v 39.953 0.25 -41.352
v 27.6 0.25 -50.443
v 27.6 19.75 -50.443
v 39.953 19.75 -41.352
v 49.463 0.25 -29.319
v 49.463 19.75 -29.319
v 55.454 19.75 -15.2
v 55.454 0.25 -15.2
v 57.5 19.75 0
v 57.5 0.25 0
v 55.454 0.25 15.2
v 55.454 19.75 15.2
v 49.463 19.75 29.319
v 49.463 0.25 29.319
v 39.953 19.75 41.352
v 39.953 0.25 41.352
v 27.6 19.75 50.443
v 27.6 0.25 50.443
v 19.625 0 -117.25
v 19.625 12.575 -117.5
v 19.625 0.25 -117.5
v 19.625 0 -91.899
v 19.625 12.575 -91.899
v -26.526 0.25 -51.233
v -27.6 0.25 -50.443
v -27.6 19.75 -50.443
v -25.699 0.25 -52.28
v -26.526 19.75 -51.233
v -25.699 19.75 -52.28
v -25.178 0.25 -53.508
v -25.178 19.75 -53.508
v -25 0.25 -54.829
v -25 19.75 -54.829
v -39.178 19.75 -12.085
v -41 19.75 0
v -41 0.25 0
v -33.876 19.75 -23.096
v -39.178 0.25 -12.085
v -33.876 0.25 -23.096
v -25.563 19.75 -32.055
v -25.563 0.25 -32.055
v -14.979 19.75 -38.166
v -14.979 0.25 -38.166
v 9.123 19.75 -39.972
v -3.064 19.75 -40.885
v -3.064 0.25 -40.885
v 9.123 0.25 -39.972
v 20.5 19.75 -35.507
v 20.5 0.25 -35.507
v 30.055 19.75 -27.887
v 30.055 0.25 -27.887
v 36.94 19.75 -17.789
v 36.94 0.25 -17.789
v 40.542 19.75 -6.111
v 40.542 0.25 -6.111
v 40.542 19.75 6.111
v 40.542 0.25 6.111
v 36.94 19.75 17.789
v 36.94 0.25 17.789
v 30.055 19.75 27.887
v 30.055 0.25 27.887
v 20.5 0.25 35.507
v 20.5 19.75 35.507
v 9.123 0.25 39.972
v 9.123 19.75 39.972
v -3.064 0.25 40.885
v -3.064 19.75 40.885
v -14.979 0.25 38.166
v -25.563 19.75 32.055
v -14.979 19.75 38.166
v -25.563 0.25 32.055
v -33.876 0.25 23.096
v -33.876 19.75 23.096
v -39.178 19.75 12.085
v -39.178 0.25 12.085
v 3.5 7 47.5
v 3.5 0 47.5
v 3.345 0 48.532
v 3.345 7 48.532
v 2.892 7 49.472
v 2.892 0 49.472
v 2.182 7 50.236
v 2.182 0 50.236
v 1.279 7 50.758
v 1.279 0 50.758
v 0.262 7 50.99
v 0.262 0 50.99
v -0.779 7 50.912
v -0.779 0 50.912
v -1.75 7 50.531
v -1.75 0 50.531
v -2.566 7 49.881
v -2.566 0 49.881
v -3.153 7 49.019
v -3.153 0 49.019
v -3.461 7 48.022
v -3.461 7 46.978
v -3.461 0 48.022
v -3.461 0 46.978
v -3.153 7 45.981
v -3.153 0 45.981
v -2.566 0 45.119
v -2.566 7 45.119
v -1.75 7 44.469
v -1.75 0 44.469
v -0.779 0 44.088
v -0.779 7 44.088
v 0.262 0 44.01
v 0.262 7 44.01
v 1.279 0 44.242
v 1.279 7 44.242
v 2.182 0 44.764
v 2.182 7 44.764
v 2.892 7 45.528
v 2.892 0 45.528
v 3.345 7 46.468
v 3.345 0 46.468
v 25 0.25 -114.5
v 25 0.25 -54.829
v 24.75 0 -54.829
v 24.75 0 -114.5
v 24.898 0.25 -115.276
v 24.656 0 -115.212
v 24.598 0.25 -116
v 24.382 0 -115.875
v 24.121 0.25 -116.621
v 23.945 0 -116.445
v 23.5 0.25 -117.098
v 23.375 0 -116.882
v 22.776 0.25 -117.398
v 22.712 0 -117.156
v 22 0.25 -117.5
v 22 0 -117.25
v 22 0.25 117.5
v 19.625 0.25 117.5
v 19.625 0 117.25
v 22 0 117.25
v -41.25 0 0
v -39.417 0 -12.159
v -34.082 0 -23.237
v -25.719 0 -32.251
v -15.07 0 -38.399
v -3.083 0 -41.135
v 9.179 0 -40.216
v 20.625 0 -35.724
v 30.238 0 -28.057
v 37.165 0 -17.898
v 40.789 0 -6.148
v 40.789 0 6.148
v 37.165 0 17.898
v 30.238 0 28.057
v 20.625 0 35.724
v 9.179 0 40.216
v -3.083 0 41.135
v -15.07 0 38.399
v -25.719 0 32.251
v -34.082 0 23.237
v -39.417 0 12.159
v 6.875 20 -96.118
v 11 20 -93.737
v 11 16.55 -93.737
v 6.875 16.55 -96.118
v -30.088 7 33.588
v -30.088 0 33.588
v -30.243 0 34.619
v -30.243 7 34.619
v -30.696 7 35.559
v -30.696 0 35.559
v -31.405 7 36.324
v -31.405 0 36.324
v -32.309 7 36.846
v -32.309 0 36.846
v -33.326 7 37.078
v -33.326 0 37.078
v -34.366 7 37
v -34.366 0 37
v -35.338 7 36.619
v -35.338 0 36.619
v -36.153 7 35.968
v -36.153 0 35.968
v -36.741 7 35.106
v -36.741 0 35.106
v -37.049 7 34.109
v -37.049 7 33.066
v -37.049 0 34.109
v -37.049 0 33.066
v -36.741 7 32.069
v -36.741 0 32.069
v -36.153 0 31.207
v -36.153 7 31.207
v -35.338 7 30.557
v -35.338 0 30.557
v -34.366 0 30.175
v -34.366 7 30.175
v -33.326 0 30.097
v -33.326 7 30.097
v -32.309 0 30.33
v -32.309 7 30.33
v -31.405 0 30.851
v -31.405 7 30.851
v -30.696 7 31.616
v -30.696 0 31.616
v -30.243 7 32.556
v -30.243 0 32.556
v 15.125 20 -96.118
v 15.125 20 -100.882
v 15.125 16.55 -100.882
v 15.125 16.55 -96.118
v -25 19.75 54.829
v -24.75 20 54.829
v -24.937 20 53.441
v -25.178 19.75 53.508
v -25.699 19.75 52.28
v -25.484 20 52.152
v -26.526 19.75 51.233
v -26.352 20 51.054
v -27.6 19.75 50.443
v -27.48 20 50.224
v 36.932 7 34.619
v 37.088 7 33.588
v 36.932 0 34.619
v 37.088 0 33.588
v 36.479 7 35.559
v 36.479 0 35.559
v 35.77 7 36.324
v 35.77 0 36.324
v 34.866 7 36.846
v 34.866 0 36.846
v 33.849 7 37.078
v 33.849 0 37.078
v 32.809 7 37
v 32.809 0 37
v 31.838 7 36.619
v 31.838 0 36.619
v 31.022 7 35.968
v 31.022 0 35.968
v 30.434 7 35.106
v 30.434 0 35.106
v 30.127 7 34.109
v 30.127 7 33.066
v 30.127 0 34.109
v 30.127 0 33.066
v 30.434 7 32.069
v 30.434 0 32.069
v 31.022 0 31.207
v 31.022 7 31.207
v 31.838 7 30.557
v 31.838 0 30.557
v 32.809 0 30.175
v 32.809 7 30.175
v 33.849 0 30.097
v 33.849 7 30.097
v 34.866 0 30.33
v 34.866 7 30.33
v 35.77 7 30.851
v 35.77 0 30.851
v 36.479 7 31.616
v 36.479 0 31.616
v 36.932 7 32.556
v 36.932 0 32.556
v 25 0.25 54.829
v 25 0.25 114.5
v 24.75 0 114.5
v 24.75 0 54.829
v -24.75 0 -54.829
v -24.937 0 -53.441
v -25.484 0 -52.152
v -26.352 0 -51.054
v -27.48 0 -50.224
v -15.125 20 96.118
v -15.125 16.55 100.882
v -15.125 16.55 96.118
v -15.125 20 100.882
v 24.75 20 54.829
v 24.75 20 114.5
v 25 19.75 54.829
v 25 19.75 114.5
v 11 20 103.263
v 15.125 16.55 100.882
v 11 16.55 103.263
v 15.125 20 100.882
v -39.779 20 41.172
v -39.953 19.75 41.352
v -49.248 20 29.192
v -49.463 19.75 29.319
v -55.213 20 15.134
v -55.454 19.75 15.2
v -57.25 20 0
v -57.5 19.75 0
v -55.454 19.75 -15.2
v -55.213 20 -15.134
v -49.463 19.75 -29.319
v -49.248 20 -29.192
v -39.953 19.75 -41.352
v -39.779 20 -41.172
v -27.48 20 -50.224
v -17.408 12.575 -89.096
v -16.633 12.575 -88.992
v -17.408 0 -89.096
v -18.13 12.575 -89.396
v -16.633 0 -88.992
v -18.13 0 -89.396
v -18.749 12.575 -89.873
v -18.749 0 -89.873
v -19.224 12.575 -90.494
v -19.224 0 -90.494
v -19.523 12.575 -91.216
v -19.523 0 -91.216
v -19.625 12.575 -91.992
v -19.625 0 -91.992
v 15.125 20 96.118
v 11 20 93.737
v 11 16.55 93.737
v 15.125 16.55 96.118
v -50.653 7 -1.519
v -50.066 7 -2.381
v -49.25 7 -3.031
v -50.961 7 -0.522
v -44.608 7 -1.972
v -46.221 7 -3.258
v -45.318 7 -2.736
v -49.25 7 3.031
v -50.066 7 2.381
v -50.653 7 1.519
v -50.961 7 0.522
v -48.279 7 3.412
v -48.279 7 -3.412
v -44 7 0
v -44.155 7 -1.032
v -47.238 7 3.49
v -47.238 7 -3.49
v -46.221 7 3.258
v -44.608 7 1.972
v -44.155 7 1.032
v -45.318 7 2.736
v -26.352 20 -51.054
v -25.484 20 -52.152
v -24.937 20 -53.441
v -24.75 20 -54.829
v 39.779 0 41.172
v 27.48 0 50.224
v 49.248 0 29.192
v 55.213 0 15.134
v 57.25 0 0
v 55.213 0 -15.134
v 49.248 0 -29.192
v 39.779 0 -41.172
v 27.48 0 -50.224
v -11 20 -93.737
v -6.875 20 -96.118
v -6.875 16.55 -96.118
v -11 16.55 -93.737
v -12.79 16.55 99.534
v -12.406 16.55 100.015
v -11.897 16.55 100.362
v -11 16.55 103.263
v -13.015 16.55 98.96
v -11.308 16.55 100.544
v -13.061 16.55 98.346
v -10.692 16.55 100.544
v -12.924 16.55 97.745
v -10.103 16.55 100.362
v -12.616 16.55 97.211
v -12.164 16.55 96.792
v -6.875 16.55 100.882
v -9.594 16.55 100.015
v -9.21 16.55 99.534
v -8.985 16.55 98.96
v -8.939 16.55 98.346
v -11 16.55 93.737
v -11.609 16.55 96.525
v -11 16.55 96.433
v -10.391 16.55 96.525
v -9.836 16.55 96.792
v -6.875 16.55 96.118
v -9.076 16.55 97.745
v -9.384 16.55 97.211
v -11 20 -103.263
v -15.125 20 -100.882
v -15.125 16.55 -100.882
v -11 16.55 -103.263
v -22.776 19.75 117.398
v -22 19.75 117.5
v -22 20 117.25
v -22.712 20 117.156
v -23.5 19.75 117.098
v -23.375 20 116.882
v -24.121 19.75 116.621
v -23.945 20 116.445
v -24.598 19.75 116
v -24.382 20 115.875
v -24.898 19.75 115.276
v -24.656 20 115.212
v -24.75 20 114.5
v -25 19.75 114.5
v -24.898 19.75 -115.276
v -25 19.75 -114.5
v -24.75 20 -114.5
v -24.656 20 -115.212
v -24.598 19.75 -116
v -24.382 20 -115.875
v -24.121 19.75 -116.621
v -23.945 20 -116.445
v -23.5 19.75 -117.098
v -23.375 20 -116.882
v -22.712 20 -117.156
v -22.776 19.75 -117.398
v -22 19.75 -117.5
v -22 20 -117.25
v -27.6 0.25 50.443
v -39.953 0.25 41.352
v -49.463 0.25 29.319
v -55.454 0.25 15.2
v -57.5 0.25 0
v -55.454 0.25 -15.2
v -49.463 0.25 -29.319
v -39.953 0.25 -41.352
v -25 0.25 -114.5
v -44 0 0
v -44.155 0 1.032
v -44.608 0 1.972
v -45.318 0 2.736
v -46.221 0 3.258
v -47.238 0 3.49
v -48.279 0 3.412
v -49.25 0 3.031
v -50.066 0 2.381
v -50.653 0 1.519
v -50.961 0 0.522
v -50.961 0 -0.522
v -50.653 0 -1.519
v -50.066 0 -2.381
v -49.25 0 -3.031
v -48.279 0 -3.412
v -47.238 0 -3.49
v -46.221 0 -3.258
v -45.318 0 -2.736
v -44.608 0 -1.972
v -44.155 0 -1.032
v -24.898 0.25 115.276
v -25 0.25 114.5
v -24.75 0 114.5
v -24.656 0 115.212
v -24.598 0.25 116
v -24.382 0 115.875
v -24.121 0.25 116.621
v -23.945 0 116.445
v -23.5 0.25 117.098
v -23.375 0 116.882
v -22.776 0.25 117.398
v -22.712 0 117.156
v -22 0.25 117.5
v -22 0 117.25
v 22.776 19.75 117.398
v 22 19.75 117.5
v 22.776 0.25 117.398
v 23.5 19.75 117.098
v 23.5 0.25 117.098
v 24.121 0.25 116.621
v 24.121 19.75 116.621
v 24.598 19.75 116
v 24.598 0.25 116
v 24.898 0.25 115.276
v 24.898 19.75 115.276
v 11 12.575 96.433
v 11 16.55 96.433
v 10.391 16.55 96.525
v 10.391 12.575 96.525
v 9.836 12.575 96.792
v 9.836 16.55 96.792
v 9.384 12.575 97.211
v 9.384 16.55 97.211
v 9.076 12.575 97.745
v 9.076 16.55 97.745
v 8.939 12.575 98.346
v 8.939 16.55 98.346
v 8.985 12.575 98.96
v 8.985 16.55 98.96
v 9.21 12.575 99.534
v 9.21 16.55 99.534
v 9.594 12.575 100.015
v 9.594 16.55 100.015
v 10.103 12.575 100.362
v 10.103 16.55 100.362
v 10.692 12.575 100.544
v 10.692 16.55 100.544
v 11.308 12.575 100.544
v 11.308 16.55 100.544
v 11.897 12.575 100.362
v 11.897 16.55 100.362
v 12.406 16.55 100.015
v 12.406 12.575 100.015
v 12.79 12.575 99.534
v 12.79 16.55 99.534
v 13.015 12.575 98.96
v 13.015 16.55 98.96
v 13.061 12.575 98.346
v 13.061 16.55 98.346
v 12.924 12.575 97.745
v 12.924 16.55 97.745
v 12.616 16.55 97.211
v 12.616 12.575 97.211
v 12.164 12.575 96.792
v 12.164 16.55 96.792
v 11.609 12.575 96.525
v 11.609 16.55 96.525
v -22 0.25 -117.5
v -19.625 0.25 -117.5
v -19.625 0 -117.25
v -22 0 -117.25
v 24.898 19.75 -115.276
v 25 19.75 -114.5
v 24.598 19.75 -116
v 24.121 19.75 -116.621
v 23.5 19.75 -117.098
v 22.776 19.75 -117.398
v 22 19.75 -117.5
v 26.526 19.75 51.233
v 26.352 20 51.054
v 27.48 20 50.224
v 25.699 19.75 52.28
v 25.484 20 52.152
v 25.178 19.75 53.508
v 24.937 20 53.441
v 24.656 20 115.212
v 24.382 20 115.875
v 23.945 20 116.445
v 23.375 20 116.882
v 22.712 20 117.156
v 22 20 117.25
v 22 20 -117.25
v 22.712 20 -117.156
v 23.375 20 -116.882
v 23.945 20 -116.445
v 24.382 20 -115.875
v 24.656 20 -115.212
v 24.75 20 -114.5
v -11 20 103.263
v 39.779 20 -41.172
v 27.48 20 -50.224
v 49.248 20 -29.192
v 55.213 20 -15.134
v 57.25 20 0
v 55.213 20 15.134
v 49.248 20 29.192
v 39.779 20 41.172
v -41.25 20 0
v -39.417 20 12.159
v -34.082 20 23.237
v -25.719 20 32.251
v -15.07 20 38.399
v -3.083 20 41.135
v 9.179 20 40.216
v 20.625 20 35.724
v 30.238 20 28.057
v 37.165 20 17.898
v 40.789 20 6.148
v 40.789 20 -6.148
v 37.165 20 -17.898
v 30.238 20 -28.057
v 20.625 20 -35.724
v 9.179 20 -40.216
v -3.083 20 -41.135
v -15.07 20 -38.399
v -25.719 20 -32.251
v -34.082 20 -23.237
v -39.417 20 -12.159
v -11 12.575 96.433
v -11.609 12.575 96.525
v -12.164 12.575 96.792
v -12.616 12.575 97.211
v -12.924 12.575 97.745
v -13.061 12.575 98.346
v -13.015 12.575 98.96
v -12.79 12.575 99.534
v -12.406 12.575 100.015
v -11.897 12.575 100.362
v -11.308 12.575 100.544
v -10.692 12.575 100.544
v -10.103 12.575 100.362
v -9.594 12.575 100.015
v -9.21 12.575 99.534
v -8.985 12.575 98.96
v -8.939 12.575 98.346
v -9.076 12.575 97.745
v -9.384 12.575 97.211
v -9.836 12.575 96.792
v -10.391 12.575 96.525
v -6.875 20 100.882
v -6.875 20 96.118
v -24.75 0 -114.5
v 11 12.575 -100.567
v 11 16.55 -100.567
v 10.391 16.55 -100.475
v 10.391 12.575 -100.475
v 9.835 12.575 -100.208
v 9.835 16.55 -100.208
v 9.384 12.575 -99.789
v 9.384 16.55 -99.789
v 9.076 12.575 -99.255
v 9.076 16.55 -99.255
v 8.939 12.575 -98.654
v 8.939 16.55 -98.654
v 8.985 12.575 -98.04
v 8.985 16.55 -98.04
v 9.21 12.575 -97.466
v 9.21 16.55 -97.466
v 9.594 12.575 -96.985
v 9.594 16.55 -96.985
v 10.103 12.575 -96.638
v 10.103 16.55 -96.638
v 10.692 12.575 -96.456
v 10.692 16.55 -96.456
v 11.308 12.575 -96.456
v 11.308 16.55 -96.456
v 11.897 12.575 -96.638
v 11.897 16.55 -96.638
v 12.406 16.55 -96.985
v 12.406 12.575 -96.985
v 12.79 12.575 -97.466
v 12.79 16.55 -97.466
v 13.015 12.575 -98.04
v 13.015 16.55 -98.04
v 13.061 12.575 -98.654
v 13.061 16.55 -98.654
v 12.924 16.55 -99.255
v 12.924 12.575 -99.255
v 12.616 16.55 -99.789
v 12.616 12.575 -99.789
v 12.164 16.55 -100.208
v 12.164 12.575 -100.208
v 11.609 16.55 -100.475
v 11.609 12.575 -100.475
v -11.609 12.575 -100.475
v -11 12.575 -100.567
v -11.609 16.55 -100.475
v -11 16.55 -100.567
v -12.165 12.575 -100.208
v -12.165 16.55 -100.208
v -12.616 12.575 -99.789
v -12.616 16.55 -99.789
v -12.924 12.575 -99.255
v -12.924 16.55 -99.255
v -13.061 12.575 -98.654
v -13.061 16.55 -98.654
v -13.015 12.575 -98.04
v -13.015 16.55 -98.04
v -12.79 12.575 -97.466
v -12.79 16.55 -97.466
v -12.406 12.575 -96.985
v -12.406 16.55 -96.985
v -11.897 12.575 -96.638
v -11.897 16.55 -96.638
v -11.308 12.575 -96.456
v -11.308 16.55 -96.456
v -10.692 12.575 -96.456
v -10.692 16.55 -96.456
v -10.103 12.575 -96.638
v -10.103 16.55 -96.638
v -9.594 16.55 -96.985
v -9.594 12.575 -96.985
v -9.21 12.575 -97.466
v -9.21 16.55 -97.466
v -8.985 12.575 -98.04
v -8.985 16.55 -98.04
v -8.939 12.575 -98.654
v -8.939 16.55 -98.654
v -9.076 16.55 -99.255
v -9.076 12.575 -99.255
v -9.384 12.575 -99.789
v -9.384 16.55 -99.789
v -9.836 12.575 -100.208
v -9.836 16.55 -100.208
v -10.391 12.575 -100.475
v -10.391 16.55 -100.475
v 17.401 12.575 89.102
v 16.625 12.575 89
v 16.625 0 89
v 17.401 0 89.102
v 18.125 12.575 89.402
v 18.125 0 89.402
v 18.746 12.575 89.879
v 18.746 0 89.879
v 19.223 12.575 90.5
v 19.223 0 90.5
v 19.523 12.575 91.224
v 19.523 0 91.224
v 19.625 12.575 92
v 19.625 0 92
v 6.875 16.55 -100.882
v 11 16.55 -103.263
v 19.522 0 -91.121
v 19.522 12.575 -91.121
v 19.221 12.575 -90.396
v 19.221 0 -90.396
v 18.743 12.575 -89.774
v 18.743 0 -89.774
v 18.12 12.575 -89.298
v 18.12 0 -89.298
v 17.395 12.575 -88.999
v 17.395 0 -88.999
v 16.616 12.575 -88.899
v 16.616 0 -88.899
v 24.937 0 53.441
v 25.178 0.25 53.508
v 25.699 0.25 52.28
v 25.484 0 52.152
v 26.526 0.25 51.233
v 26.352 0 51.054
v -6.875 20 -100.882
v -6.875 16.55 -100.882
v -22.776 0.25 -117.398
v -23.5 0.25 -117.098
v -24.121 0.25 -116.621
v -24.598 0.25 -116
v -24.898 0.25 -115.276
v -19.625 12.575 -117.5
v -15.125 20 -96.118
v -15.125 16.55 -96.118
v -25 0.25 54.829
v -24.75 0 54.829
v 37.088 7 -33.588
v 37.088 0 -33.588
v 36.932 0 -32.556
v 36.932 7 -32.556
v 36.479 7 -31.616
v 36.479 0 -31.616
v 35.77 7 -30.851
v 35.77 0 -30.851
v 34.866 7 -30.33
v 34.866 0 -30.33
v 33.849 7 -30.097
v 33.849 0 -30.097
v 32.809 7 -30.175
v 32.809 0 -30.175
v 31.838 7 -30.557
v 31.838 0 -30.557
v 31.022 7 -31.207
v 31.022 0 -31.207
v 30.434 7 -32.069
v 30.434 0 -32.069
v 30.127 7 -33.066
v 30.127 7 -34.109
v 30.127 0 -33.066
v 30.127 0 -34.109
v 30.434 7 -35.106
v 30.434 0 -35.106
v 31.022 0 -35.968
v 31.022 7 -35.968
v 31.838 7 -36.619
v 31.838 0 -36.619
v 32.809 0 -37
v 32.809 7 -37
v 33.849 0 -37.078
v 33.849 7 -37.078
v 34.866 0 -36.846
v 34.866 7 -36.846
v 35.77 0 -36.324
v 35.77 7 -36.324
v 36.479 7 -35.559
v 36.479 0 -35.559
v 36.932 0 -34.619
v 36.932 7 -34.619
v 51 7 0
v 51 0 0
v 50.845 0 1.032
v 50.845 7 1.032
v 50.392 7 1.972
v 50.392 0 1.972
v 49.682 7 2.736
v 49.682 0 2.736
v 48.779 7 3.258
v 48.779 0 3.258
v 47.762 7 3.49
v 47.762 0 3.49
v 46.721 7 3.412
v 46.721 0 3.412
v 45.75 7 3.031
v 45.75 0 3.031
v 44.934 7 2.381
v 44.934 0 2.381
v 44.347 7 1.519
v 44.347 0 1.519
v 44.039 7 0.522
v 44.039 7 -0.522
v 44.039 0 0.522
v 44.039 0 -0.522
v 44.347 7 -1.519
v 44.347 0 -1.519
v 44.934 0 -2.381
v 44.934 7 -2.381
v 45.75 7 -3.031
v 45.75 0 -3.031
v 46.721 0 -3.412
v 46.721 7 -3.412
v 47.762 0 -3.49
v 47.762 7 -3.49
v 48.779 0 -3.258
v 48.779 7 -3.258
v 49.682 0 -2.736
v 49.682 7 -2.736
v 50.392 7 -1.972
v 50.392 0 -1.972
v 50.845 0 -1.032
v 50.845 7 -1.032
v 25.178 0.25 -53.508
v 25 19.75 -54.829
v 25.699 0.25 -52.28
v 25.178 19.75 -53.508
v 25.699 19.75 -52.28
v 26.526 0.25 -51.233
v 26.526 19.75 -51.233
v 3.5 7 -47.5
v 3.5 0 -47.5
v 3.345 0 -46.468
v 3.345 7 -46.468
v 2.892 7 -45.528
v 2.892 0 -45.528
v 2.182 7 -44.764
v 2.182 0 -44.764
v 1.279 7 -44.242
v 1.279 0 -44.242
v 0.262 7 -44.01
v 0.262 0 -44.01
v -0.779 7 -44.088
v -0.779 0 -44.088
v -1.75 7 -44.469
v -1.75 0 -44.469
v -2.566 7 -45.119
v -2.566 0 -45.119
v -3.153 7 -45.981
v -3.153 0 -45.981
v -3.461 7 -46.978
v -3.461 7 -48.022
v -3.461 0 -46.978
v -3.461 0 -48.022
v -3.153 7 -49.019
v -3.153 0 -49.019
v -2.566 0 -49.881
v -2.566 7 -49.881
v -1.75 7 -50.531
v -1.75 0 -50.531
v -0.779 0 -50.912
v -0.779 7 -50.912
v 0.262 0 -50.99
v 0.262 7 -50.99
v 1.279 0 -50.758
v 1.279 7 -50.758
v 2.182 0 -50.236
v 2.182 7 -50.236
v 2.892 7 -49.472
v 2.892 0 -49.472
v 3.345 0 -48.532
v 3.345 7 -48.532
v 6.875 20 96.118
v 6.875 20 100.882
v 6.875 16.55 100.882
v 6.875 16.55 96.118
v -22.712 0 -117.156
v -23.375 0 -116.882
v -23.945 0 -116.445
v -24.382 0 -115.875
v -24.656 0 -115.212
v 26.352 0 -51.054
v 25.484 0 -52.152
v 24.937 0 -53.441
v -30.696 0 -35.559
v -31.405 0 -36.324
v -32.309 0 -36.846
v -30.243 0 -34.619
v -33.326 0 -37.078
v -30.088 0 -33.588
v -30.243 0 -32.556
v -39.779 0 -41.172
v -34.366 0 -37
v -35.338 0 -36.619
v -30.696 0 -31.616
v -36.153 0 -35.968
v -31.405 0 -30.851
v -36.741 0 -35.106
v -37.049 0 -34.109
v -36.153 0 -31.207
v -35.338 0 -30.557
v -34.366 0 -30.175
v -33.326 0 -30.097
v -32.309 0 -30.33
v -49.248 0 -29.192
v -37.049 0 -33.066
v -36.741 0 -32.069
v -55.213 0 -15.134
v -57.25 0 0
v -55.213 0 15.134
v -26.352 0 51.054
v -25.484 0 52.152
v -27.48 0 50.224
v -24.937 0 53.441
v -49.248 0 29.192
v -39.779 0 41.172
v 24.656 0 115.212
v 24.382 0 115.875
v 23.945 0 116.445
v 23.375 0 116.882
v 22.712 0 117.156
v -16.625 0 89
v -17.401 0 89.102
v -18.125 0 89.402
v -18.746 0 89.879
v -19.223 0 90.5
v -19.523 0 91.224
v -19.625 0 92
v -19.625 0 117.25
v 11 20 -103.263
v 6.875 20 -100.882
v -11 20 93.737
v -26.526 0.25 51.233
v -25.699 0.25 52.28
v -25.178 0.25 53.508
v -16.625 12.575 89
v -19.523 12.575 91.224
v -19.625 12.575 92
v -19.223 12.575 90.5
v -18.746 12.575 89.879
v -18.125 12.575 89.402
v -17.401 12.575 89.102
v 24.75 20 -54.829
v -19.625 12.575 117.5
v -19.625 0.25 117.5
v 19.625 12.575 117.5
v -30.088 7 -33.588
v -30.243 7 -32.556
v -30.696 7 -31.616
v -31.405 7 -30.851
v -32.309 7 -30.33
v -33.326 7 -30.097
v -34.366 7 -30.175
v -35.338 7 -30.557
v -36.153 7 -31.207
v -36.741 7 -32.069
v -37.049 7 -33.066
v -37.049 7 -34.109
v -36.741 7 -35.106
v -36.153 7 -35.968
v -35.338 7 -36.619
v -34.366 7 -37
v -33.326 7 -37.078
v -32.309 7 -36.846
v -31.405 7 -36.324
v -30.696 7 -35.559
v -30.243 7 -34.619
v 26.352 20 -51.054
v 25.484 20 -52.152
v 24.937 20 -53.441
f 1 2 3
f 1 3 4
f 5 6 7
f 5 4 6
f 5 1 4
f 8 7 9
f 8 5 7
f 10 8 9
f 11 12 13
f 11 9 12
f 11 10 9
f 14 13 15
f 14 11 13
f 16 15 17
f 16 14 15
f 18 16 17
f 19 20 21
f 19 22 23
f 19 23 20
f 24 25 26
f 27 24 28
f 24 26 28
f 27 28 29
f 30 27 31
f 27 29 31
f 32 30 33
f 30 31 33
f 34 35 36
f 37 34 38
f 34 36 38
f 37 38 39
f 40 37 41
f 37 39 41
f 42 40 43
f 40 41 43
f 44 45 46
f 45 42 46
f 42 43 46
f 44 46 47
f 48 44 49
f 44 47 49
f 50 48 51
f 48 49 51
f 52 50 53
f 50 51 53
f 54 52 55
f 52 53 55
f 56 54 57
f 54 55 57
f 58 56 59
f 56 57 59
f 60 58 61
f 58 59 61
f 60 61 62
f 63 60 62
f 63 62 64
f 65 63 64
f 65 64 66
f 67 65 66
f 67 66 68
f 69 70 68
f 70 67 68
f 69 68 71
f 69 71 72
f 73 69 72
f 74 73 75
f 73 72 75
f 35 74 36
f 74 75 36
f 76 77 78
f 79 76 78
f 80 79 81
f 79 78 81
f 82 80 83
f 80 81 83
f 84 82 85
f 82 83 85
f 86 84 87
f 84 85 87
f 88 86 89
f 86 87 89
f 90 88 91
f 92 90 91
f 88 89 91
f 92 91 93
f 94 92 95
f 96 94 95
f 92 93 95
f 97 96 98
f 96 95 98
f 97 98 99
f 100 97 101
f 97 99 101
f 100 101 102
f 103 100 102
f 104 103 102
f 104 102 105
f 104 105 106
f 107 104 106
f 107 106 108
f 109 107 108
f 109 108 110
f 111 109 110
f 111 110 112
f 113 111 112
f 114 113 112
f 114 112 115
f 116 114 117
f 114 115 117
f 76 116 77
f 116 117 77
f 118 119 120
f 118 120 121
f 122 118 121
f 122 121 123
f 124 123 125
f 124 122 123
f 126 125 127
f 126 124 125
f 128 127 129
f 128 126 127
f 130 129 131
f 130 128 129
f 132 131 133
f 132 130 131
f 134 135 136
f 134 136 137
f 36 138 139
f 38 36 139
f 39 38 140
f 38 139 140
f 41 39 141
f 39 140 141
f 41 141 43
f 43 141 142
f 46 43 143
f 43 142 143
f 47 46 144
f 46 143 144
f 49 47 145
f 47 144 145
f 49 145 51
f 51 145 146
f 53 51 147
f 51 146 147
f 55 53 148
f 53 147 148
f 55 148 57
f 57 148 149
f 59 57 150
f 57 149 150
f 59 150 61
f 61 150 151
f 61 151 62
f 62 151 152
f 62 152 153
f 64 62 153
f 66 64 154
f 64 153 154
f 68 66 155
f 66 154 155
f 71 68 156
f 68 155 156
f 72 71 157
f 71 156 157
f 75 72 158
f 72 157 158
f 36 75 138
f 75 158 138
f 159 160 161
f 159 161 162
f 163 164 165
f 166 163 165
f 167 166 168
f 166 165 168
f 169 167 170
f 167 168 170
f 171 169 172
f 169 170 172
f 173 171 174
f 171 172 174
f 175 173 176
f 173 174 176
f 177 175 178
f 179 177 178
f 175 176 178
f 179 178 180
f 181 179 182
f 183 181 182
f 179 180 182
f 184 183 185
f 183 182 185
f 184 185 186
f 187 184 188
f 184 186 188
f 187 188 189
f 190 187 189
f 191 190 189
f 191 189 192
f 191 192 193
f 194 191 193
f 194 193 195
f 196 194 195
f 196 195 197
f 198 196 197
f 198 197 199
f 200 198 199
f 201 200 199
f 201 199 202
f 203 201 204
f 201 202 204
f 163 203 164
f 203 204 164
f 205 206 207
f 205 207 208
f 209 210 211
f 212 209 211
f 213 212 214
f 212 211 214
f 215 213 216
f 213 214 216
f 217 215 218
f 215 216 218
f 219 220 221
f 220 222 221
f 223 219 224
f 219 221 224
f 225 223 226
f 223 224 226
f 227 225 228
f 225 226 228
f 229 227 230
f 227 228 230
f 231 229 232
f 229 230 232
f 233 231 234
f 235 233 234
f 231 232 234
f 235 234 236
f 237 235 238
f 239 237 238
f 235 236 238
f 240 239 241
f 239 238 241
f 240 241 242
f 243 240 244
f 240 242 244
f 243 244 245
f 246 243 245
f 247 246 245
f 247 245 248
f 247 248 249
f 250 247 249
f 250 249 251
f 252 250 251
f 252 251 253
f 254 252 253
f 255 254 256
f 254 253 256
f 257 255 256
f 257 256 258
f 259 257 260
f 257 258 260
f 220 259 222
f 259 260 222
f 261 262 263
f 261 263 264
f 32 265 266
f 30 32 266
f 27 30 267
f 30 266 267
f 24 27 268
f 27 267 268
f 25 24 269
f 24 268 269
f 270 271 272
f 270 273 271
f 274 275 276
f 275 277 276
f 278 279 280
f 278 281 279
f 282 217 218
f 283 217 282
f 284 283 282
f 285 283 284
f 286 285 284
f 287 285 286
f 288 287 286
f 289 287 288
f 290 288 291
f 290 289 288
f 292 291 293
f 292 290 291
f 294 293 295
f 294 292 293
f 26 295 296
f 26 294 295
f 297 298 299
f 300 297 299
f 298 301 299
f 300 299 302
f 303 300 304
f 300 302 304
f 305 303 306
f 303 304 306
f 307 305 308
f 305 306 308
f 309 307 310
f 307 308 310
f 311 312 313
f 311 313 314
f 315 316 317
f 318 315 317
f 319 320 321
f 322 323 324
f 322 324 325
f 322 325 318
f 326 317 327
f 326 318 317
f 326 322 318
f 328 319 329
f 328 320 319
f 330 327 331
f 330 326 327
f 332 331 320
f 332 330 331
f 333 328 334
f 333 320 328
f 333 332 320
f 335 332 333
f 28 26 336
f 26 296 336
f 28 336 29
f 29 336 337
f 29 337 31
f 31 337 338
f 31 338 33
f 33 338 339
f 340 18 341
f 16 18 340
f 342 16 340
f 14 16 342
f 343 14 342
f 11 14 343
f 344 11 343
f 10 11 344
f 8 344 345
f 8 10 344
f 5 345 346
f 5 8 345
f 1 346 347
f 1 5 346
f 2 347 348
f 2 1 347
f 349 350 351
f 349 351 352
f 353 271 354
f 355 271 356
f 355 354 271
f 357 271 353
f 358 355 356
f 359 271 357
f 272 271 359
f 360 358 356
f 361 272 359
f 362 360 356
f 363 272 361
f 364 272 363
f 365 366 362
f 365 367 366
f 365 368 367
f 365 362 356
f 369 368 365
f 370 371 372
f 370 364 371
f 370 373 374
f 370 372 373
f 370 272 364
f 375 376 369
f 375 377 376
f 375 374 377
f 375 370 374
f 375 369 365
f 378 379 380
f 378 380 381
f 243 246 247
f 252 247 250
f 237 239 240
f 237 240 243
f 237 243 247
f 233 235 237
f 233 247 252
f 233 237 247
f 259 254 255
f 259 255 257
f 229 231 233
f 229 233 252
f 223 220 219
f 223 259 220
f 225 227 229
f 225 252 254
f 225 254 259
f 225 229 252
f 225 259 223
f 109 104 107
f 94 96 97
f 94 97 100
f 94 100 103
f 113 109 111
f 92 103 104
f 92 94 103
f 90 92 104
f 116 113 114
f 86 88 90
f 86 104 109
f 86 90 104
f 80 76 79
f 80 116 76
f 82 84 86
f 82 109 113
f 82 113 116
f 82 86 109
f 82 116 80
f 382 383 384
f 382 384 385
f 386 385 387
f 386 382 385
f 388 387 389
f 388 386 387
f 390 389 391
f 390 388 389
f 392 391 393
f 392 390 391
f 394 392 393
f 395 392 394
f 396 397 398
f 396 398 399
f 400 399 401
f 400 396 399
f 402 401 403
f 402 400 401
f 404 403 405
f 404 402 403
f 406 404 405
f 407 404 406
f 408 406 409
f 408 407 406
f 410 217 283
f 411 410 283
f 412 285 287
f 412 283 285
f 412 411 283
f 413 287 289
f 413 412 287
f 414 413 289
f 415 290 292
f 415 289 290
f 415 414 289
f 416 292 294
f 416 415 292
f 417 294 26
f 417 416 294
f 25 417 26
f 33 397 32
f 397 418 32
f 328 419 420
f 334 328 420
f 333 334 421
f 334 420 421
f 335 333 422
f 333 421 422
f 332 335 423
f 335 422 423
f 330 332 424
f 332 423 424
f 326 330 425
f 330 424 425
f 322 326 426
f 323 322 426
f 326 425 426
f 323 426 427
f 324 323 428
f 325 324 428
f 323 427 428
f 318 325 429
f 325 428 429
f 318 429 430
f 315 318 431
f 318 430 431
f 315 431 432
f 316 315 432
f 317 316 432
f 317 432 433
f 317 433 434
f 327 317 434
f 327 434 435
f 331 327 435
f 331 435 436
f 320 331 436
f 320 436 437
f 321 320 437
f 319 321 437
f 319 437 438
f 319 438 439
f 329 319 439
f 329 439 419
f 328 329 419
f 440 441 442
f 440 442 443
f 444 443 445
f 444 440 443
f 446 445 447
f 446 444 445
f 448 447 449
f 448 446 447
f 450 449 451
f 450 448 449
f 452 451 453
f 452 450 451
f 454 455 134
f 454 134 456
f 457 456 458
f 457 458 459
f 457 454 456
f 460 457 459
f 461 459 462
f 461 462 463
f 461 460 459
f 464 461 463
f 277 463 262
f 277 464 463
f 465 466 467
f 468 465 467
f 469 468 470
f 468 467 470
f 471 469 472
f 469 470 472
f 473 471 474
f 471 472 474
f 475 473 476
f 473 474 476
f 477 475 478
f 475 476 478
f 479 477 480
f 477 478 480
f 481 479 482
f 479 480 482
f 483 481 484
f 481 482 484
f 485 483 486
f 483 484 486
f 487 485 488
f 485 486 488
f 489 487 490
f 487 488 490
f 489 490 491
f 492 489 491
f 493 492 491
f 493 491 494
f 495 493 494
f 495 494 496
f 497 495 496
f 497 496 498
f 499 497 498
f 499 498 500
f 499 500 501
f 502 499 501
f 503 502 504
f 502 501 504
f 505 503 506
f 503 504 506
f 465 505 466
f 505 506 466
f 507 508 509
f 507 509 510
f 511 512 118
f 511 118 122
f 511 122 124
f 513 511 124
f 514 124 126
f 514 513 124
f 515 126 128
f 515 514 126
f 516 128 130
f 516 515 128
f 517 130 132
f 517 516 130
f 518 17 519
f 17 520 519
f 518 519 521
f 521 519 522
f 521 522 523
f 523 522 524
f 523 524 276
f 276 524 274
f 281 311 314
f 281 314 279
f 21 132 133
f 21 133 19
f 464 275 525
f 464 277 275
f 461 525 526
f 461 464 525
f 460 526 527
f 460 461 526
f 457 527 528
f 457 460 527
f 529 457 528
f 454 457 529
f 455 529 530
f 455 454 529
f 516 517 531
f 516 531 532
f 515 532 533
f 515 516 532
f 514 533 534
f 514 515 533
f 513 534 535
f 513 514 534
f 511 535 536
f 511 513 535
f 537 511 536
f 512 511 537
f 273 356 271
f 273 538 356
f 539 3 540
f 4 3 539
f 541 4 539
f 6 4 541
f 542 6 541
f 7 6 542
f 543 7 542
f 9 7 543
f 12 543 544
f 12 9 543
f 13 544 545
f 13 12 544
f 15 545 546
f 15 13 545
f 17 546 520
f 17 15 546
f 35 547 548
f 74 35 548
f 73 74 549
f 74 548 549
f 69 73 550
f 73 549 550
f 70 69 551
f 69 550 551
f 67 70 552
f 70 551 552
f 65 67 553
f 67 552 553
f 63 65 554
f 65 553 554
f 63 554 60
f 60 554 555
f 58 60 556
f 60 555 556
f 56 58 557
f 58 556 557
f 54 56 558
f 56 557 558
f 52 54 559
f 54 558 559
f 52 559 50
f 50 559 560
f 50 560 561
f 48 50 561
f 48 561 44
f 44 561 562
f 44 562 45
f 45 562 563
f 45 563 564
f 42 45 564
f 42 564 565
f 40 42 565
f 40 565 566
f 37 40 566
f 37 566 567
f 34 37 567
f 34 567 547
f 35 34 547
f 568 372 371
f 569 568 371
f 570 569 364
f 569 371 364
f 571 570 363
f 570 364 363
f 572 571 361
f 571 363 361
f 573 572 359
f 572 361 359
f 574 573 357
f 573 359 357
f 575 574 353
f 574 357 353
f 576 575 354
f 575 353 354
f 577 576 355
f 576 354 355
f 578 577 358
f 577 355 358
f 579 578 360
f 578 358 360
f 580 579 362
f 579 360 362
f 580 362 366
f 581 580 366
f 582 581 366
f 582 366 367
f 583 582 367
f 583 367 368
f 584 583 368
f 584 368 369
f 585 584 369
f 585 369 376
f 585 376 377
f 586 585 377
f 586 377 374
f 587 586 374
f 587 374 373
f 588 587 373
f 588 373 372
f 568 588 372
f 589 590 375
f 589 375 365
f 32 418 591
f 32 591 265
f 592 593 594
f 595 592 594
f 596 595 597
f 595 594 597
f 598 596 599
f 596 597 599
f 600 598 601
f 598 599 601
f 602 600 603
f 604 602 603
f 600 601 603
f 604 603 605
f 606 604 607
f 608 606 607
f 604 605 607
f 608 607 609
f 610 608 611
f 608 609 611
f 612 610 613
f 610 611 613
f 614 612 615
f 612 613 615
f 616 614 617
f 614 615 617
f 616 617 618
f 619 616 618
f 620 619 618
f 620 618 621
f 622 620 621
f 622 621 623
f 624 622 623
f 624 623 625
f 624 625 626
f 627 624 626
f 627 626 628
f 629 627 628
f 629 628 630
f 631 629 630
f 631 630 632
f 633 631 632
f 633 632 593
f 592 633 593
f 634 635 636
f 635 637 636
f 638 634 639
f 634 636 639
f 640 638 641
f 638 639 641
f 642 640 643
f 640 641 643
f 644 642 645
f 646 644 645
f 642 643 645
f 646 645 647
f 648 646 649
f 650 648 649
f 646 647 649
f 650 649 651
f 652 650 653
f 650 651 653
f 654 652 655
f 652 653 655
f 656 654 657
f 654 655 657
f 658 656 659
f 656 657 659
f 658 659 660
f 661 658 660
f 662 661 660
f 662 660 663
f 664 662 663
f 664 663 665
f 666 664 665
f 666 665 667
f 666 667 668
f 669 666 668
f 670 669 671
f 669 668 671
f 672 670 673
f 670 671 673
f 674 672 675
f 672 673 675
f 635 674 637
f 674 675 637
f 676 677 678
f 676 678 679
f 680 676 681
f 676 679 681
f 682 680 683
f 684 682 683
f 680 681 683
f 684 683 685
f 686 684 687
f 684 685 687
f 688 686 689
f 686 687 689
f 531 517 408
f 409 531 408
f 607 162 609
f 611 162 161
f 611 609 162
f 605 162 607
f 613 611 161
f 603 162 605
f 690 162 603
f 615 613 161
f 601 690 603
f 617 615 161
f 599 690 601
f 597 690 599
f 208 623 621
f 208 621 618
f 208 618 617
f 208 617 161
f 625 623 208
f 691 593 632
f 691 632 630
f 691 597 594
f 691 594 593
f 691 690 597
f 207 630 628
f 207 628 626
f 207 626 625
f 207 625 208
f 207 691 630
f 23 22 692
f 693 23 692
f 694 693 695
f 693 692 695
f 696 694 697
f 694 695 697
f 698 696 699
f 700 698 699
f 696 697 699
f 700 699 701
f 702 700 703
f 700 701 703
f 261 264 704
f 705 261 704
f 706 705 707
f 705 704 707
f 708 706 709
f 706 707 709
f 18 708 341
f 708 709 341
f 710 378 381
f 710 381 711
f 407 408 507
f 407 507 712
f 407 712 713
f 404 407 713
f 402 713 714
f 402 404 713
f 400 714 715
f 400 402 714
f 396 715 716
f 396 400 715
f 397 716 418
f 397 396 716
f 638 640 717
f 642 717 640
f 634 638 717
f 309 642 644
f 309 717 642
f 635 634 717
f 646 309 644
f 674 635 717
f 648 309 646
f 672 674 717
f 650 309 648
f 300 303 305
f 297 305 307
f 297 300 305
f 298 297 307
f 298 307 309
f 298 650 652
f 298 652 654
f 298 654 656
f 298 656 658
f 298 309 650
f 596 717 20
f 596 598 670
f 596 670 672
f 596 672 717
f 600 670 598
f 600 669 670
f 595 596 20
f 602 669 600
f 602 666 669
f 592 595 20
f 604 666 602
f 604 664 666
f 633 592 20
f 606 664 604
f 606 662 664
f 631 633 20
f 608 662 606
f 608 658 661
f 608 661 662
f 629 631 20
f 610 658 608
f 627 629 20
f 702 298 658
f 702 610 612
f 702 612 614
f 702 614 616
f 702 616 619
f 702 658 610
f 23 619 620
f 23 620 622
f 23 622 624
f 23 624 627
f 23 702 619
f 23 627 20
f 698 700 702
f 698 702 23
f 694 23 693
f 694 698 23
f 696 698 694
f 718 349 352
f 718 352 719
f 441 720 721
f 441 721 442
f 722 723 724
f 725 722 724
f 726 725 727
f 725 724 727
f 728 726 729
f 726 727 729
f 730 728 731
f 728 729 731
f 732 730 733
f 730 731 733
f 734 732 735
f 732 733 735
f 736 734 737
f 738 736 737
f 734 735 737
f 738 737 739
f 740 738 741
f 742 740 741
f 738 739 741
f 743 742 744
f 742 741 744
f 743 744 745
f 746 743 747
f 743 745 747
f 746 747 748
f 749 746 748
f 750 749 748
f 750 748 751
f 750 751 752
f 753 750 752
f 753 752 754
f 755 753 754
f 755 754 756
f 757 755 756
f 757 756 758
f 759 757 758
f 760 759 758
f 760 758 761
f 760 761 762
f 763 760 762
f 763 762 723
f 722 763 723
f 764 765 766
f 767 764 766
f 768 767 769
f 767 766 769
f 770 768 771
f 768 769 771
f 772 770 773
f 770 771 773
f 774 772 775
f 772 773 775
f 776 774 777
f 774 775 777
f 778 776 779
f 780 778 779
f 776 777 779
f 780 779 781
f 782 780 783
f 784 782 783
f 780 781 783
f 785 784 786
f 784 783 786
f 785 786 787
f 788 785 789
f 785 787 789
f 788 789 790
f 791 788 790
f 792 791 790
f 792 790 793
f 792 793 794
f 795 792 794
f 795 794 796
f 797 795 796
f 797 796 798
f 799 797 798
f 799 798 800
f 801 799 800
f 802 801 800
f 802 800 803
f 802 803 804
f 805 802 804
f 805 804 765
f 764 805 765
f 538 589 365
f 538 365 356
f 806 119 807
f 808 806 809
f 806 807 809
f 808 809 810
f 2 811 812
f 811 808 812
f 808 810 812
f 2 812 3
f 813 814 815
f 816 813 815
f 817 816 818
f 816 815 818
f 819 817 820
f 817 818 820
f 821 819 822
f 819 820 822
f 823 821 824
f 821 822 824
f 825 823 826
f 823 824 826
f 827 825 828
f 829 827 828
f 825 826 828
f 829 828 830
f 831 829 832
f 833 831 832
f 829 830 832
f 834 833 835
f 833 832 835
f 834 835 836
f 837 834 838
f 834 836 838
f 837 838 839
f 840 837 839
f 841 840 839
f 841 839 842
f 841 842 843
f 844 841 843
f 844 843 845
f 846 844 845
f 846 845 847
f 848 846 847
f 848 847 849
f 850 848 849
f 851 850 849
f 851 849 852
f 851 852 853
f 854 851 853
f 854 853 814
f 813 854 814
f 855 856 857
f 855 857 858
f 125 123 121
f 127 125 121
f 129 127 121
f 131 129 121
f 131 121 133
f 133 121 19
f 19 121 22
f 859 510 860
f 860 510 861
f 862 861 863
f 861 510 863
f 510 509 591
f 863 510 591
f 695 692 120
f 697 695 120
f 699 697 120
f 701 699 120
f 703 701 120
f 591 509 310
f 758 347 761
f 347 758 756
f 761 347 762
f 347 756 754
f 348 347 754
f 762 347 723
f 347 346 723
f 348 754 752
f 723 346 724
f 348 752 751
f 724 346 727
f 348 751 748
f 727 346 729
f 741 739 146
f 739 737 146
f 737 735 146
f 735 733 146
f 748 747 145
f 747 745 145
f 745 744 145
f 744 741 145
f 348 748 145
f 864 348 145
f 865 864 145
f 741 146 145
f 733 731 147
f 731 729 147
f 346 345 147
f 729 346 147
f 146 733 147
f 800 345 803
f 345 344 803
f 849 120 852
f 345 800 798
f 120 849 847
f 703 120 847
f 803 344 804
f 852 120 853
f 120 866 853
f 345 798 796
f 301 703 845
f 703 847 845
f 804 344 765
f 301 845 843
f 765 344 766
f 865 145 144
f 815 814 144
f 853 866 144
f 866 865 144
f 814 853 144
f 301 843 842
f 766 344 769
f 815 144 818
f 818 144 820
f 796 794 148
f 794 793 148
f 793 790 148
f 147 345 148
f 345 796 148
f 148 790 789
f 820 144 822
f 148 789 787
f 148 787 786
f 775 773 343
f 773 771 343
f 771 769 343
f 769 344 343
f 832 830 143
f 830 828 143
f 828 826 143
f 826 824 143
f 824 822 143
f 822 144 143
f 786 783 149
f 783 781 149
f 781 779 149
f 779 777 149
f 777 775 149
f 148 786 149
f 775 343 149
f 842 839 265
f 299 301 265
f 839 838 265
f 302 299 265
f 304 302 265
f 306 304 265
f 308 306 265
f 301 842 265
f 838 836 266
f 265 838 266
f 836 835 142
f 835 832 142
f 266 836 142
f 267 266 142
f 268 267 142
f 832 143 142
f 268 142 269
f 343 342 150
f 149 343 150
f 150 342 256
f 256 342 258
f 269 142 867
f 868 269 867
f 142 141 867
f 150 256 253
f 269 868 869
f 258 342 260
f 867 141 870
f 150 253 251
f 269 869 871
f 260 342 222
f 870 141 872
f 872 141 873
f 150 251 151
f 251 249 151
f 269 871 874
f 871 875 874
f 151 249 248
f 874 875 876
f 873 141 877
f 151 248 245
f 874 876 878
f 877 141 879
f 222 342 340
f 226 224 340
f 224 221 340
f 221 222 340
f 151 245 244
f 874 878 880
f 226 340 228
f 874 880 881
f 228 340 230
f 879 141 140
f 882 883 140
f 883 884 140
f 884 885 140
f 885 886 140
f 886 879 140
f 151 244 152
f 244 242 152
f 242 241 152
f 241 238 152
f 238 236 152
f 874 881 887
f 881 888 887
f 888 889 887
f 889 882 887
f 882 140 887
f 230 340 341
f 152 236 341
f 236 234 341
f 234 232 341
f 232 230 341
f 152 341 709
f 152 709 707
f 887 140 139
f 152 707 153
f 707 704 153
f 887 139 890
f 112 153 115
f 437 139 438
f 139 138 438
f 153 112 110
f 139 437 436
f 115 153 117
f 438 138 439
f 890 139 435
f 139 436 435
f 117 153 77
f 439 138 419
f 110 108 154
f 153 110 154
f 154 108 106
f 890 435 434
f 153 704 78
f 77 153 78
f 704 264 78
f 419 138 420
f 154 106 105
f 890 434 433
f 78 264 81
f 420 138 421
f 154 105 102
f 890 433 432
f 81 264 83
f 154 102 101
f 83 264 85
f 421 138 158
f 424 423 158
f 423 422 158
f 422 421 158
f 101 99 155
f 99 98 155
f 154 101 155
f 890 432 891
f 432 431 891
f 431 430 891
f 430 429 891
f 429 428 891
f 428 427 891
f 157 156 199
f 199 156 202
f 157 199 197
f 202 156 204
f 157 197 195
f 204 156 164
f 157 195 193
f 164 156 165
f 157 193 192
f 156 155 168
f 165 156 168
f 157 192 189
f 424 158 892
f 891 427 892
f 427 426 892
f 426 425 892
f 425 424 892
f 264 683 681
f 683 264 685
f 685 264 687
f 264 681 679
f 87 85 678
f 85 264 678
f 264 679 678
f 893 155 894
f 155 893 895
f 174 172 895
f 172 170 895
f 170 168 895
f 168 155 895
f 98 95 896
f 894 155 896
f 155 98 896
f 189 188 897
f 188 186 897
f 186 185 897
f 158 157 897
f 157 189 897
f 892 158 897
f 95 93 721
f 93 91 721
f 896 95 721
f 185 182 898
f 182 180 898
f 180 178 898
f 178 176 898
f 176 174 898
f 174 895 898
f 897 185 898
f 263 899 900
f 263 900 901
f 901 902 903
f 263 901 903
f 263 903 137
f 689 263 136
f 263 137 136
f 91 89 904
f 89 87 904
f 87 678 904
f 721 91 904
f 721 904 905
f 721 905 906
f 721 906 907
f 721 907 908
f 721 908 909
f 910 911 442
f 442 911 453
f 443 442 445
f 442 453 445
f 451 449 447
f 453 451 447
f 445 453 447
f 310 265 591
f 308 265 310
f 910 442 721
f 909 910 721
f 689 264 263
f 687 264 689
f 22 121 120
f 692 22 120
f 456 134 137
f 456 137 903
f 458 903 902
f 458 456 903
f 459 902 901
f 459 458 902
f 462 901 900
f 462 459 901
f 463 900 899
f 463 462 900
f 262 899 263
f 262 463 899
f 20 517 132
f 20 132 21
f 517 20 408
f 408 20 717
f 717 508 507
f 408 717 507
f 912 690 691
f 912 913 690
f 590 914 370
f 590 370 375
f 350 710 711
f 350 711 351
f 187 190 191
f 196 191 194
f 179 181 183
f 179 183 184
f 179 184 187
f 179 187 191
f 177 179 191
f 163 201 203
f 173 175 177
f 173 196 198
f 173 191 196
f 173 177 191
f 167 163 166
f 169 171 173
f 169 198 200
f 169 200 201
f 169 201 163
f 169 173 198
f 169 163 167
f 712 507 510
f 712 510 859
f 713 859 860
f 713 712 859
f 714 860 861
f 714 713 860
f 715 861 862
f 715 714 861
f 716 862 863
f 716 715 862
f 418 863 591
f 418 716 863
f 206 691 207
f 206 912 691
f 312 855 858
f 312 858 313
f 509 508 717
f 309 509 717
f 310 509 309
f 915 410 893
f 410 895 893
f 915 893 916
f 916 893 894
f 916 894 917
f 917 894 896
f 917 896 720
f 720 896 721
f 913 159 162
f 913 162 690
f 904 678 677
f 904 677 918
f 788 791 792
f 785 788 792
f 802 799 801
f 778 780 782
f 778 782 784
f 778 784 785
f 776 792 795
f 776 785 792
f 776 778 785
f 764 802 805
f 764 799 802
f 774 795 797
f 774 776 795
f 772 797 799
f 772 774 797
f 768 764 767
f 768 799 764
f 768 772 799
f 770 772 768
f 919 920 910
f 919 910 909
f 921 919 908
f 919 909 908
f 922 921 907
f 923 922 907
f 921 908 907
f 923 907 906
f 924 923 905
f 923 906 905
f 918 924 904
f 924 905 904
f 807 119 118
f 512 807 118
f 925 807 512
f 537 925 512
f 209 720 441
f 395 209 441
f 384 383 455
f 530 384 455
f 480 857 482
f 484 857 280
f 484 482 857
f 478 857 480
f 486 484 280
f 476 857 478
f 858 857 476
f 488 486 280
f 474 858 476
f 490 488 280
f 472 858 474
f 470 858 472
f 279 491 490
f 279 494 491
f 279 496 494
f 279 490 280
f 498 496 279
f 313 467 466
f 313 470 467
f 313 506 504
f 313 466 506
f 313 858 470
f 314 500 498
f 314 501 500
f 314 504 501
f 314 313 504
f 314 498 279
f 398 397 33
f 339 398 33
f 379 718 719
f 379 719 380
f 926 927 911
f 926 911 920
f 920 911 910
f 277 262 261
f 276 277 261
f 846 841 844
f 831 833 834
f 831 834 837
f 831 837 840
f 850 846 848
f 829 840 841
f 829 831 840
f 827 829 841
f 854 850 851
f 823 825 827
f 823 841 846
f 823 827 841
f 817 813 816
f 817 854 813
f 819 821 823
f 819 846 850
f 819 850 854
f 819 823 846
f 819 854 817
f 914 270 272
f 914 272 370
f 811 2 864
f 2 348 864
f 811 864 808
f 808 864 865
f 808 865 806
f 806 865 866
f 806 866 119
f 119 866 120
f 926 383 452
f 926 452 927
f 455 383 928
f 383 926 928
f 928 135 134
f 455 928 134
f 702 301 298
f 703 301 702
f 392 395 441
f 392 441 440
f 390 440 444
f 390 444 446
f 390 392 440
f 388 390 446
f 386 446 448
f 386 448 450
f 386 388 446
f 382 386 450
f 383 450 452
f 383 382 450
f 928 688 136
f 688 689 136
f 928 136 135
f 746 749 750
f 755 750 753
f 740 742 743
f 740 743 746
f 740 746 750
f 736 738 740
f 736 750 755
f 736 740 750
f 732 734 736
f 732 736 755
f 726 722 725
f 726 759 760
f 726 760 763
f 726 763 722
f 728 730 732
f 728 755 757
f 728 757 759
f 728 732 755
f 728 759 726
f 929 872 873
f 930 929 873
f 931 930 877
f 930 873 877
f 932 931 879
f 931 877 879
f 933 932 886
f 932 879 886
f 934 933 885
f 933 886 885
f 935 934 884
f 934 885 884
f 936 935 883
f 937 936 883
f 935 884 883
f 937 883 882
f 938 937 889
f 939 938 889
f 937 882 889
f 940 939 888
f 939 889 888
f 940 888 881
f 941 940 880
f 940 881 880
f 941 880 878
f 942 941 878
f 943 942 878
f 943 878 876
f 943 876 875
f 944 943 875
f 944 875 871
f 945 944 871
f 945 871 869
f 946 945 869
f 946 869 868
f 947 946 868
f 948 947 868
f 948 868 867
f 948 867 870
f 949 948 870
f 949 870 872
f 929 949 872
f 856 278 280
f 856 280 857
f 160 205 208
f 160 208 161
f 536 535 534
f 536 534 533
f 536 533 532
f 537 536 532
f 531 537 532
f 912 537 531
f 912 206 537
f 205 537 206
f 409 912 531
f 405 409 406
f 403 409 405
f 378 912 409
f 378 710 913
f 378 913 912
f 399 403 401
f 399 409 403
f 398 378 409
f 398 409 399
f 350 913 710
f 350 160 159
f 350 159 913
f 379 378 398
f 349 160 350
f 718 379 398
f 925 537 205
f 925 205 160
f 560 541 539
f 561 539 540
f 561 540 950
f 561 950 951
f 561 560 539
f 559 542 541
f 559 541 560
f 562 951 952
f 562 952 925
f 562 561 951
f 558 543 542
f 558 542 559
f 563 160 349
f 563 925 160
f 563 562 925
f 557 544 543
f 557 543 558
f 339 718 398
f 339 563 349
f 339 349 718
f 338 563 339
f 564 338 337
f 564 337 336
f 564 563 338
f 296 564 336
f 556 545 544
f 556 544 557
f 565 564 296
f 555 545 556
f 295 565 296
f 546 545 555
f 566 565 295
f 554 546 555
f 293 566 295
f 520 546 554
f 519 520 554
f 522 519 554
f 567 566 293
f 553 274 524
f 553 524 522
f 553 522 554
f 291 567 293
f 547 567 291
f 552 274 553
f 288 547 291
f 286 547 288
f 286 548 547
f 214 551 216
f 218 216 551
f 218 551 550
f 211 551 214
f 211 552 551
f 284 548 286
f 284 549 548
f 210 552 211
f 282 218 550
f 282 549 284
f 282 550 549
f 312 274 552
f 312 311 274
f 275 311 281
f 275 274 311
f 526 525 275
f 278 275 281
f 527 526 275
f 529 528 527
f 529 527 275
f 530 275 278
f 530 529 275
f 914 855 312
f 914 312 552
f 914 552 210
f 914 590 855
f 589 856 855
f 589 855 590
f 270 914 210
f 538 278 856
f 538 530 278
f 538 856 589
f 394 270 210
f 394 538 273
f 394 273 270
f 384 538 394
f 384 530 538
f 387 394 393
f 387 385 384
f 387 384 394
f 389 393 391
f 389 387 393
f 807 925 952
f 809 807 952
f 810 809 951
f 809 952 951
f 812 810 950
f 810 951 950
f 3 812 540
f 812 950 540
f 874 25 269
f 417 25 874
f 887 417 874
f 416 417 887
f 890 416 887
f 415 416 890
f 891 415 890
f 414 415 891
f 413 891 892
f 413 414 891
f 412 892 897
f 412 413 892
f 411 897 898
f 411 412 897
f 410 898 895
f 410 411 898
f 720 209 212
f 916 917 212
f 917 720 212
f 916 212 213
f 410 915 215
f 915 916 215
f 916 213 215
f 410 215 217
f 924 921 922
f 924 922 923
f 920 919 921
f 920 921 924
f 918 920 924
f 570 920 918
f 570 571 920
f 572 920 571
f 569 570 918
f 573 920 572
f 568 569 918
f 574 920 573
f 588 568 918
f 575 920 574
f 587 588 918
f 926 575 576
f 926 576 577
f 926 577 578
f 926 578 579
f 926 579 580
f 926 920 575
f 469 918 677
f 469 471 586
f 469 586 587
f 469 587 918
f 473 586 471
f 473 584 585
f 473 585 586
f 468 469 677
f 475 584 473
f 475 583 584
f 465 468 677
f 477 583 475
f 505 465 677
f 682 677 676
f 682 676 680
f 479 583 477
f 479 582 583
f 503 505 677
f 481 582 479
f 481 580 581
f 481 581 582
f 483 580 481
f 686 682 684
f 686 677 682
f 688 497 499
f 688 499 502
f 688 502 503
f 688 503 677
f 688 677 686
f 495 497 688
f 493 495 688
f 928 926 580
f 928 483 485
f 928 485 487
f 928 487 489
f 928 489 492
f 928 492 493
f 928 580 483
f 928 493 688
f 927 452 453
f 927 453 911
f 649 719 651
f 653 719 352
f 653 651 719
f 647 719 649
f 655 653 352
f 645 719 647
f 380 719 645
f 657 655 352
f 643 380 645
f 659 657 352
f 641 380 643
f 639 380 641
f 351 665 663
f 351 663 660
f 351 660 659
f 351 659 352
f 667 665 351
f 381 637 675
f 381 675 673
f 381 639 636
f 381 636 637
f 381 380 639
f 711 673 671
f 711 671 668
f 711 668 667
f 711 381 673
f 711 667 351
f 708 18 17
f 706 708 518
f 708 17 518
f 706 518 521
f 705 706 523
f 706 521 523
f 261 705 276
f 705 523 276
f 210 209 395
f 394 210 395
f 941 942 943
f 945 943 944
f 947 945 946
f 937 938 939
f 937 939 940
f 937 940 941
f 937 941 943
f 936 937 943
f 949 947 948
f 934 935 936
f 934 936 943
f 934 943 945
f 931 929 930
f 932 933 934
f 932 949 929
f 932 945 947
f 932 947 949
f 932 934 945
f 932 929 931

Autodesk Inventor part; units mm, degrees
ref_plane "YZ Plane" through (0, 0, 0) normal (1, 0, 0) x (0, 1, 0)
ref_plane "XZ Plane" through (0, 0, 0) normal (0, 1, 0) x (-1, 0, 0)
ref_plane "XY Plane" through (0, 0, 0) normal (0, 0, 1) x (1, 0, 0)
sketch "Sketch1" plane through (0, 0, 0) normal (0, 1, 0) x (-1, 0, 0)
  circle A0 centre (0, 0) radius 41
  line L0 (25, 117.5) -> (-25, 117.5)
  line L1 (-25, -117.5) -> (25, -117.5)
  arc A1 (-25, 51.7808) -> (-25, -51.7808) centre (0, 0) ccw
  arc A2 (25, -51.7808) -> (25, 51.7808) centre (0, 0) ccw
  line L2 (-25, 117.5) -> (-25, 51.7808)
  line L3 (-25, -51.7808) -> (-25, -117.5)
  line L4 (25, -117.5) -> (25, -51.7808)
  line L5 (25, 51.7808) -> (25, 117.5)
  dimension "d0" = 82
  dimension "d76" = 50
  dimension "d77" = 57.5
  dimension "d78" = 57.5
  dimension "d79" = 65.7192
  dimension "d80" = 65.7192
  dimension "d81" = 50
  dimension "d82" = 235
extrude "Extrusion1" add sketch "Sketch1" along normal blind 20
fillet "Fillet1" radius 5 4 edges at (-25, 10, 51.7808) (25, 10, 51.7808) (25, 10, -51.7808) (-25, 10, -51.7808)
fillet "Fillet2" radius 3 4 edges at (25, 10, 117.5) (-25, 10, 117.5) (25, 10, -117.5) (-25, 10, -117.5)
chamfer "Chamfer1" distance 0.25 angle 45 26 edges at (25, 20, 84.6646) (57.5, 20, 0) (25, 20, -84.6646) (24.1213, 20, -116.6213) (0, 20, -117.5) (-24.1213, 20, -116.6213) (-25, 20, -84.6646) (-57.5, 20, 0) (-25, 20, 84.6646) (-24.1213, 20, 116.6213) (0, 20, 117.5) (24.1213, 20, 116.6213) (25, 0, 84.6646) (57.5, 0, 0) (25, 0, -84.6646) (24.1213, 0, -116.6213) (0, 0, -117.5) (-24.1213, 0, -116.6213) (-25, 0, -84.6646) (-57.5, 0, 0) (-25, 0, 84.6646) (-24.1213, 0, 116.6213) (0, 0, 117.5) (24.1213, 0, 116.6213) (41, 20, 0) (41, 0, 0)
sketch "Sketch3" plane through (0, 0, 0) normal (0, -1, 0) x (1, 0, 0)
  line L0 (-22, -117.25) -> (-22, 117.25)
  line L1 (22, 117.25) -> (22, -117.25)
  line L2 (22, -117.25) -> (-22, 117.25) construction
  line L3 (-22, -117.25) -> (22, 117.25) construction
  line L4 (16.625, 89) -> (-16.625, 89)
  line L5 (-19.625, 92) -> (-19.625, 117.25)
  line L6 (19.625, 117.25) -> (19.625, 92)
  line L7 (19.625, 89) -> (17.4099, 92.7868) construction
  line L8 (-19.625, 89) -> (-17.1837, 91.5811) construction
  line L9 (-19.625, -117.25) -> (-19.625, -91.9916)
  line L10 (-16.6334, -88.9916) -> (16.6165, -88.8986)
  line L11 (19.6248, -91.8986) -> (19.6248, -117.25)
  line L12 (-17.2012, -91.6745) -> (-19.625, -89) construction
  line L13 (17.2501, -91.935) -> (19.6248, -88.8902) construction
  line L14 (22, 117.25) -> (19.625, 117.25)
  line L15 (-22, 117.5) -> (22, 117.5) projected
  line L16 (-19.625, 117.25) -> (-22, 117.25)
  arc A0 (-16.6334, -88.9916) -> (-19.625, -91.9916) centre (-16.625, -91.9916) ccw
  arc A1 (19.6248, -91.8986) -> (16.6165, -88.8986) centre (16.6248, -91.8986) ccw
  arc A2 (-19.625, 92) -> (-16.625, 89) centre (-16.625, 92) ccw
  arc A3 (16.625, 89) -> (19.625, 92) centre (16.625, 92) ccw
  line L17 (19.6248, -117.25) -> (19.6248, -121.1164)
  line L18 (19.6248, -121.1164) -> (-19.625, -121.1164)
  line L19 (-19.625, -121.1164) -> (-19.625, -117.25)
  line L20 (19.625, 117.25) -> (19.625, 123.825)
  line L21 (19.625, 123.825) -> (-19.625, 123.825)
  line L22 (-19.625, 123.825) -> (-19.625, 117.25)
  line L23 (19.625, 117.25) -> (19.6248, 117.25)
  line L24 (22, -117.25) -> (19.6248, -117.25)
  line L25 (-19.625, -117.25) -> (-22, -117.25)
  point P0 (0, 0)
  point P1 (-19.625, 117.5)
  point P2 (19.625, 117.5)
  dimension "d35" = 39.25
  dimension "d37" = 28.25
  dimension "d38" = 28.25
  dimension "d39" = 39.25
  dimension "d40" = 3
  dimension "d41" = 3
  dimension "d42" = 3
  dimension "d50" = 2.375
  dimension "d51" = 2.375
  dimension "d52" = 44
  dimension "d53" = 39.2499
  dimension "d55" = 2.3752
  dimension "d56" = 2.375
  dimension "d83" = 234.5
extrude "Extrusion4" cut sketch "Sketch3" against normal blind 12.575 contours L9 A0 L10 A1 L11 L17 L18 L19 | L22 L15 L20 L6 A3 L4 A2 L5 | L22 L21 L20 L15
sketch "Sketch4" plane through (0, 12.575, 0) normal (0, -1, 0) x (1, 0, 0)
  circle A0 centre (11, 98.5) radius 2.2451
  circle A1 centre (-11, 98.5) radius 2.3292
  circle A2 centre (10.9998, -98.5) radius 1.5784
  circle A3 centre (-11.0002, -98.5) radius 2.3162
  line L0 (19.6248, -117.5) -> (-19.625, -117.5) projected
  line L1 (-19.625, -117.5) -> (-19.625, -91.9916) projected
  line L2 (19.6248, -91.8986) -> (19.6248, -117.5) projected
  line L3 (-19.625, 117.5) -> (19.625, 117.5) projected
  line L4 (19.625, 117.25) -> (19.625, 92) projected
  point P0 (0, 0)
  point P1 (-19.625, -117.25)
  point P2 (19.6248, -117.25)
  dimension "d45" = 19
  dimension "d48" = 19
  dimension "d57" = 19
  dimension "d58" = 19
  dimension "d59" = 22
  dimension "d60" = 22
  dimension "d61" = 8.625
  dimension "d62" = 8.625
  dimension "d92" = 4.4901
hole "Hole2" at (11, 12.575, 98.5) at (-11, 12.575, 98.5) at (10.9998, 12.575, -98.5) at (-11.0002, 12.575, -98.5) direction (0, 1, 0) diameter 4.134 end through all thread size "M5x0.8" class "6H" standard "ANSI Metric M Profile"
sketch "Sketch5" plane through (0, 20, 0) normal (0, 1, 0) x (1, 0, 0)
  circle A0 centre (-11, -98.5) radius 2.067 projected
  line L0 (-11, -93.7369) -> (-6.875, -96.1184)
  line L1 (-6.875, -96.1184) -> (-6.875, -100.8816)
  line L2 (-6.875, -100.8816) -> (-11, -103.2631)
  line L3 (-11, -103.2631) -> (-15.125, -100.8816)
  line L4 (-15.125, -100.8816) -> (-15.125, -96.1184)
  line L5 (-15.125, -96.1184) -> (-11, -93.7369)
  circle A1 centre (11, -98.5) radius 2.067 projected
  line L6 (11, -93.7369) -> (15.125, -96.1184)
  line L7 (15.125, -96.1184) -> (15.125, -100.8816)
  line L8 (15.125, -100.8816) -> (11, -103.2631)
  line L9 (11, -103.2631) -> (6.875, -100.8816)
  line L10 (6.875, -100.8816) -> (6.875, -96.1184)
  line L11 (6.875, -96.1184) -> (11, -93.7369)
  circle A2 centre (-11.0002, 98.5) radius 2.067 projected
  line L12 (-11.0002, 93.7369) -> (-15.1252, 96.1184)
  line L13 (-15.1252, 96.1184) -> (-15.1252, 100.8816)
  line L14 (-15.1252, 100.8816) -> (-11.0002, 103.2631)
  line L15 (-11.0002, 103.2631) -> (-6.8752, 100.8816)
  line L16 (-6.8752, 100.8816) -> (-6.8752, 96.1184)
  line L17 (-6.8752, 96.1184) -> (-11.0002, 93.7369)
  circle A3 centre (10.9998, 98.5) radius 2.067 projected
  line L18 (10.9998, 103.2631) -> (15.1248, 100.8816)
  line L19 (15.1248, 100.8816) -> (15.1248, 96.1184)
  line L20 (15.1248, 96.1184) -> (10.9998, 93.7369)
  line L21 (10.9998, 93.7369) -> (6.8748, 96.1184)
  line L22 (6.8748, 96.1184) -> (6.8748, 100.8816)
  line L23 (6.8748, 100.8816) -> (10.9998, 103.2631)
  point P0 (0, 0)
  point P1 (-13.0625, -102.0724)
  point P2 (-8.9377, 94.9276)
  dimension "d70" = 8.25
  dimension "d71" = 8.25
  dimension "d72" = 8.25
  dimension "d73" = 8.25
extrude "Extrusion5" cut sketch "Sketch5" against normal blind 3.45
sketch "Sketch6" plane through (0, 0, 0) normal (0, -1, 0) x (1, 0, 0)
  circle A0 centre (0, 0) radius 47.5
  circle A1 centre (0, -47.5) radius 3.5
  circle A2 centre (33.5876, -33.5876) radius 3.5
  circle A3 centre (47.5, 0) radius 3.5
  circle A4 centre (33.5876, 33.5876) radius 3.5
  circle A5 centre (0, 47.5) radius 3.5
  circle A6 centre (-33.5876, 33.5876) radius 3.5
  circle A7 centre (-47.5, 0) radius 3.5
  circle A8 centre (-33.5876, -33.5876) radius 3.5
  dimension "d84" = 95
  dimension "d85" = 7
  dimension "d88" = 360
extrude "Extrusion6" cut sketch "Sketch6" against normal blind 7 contours A0 A3 | A0 A3 | A4 A0 | A0 A4 | A2 A0 | A0 A2 | A5 A0 | A0 A5 | A1 A0 | A0 A1 | A6 A0 | A0 A6 | A8 A0 | A0 A8 | A7 A0 | A0 A7
properties part number "Head Thing"
